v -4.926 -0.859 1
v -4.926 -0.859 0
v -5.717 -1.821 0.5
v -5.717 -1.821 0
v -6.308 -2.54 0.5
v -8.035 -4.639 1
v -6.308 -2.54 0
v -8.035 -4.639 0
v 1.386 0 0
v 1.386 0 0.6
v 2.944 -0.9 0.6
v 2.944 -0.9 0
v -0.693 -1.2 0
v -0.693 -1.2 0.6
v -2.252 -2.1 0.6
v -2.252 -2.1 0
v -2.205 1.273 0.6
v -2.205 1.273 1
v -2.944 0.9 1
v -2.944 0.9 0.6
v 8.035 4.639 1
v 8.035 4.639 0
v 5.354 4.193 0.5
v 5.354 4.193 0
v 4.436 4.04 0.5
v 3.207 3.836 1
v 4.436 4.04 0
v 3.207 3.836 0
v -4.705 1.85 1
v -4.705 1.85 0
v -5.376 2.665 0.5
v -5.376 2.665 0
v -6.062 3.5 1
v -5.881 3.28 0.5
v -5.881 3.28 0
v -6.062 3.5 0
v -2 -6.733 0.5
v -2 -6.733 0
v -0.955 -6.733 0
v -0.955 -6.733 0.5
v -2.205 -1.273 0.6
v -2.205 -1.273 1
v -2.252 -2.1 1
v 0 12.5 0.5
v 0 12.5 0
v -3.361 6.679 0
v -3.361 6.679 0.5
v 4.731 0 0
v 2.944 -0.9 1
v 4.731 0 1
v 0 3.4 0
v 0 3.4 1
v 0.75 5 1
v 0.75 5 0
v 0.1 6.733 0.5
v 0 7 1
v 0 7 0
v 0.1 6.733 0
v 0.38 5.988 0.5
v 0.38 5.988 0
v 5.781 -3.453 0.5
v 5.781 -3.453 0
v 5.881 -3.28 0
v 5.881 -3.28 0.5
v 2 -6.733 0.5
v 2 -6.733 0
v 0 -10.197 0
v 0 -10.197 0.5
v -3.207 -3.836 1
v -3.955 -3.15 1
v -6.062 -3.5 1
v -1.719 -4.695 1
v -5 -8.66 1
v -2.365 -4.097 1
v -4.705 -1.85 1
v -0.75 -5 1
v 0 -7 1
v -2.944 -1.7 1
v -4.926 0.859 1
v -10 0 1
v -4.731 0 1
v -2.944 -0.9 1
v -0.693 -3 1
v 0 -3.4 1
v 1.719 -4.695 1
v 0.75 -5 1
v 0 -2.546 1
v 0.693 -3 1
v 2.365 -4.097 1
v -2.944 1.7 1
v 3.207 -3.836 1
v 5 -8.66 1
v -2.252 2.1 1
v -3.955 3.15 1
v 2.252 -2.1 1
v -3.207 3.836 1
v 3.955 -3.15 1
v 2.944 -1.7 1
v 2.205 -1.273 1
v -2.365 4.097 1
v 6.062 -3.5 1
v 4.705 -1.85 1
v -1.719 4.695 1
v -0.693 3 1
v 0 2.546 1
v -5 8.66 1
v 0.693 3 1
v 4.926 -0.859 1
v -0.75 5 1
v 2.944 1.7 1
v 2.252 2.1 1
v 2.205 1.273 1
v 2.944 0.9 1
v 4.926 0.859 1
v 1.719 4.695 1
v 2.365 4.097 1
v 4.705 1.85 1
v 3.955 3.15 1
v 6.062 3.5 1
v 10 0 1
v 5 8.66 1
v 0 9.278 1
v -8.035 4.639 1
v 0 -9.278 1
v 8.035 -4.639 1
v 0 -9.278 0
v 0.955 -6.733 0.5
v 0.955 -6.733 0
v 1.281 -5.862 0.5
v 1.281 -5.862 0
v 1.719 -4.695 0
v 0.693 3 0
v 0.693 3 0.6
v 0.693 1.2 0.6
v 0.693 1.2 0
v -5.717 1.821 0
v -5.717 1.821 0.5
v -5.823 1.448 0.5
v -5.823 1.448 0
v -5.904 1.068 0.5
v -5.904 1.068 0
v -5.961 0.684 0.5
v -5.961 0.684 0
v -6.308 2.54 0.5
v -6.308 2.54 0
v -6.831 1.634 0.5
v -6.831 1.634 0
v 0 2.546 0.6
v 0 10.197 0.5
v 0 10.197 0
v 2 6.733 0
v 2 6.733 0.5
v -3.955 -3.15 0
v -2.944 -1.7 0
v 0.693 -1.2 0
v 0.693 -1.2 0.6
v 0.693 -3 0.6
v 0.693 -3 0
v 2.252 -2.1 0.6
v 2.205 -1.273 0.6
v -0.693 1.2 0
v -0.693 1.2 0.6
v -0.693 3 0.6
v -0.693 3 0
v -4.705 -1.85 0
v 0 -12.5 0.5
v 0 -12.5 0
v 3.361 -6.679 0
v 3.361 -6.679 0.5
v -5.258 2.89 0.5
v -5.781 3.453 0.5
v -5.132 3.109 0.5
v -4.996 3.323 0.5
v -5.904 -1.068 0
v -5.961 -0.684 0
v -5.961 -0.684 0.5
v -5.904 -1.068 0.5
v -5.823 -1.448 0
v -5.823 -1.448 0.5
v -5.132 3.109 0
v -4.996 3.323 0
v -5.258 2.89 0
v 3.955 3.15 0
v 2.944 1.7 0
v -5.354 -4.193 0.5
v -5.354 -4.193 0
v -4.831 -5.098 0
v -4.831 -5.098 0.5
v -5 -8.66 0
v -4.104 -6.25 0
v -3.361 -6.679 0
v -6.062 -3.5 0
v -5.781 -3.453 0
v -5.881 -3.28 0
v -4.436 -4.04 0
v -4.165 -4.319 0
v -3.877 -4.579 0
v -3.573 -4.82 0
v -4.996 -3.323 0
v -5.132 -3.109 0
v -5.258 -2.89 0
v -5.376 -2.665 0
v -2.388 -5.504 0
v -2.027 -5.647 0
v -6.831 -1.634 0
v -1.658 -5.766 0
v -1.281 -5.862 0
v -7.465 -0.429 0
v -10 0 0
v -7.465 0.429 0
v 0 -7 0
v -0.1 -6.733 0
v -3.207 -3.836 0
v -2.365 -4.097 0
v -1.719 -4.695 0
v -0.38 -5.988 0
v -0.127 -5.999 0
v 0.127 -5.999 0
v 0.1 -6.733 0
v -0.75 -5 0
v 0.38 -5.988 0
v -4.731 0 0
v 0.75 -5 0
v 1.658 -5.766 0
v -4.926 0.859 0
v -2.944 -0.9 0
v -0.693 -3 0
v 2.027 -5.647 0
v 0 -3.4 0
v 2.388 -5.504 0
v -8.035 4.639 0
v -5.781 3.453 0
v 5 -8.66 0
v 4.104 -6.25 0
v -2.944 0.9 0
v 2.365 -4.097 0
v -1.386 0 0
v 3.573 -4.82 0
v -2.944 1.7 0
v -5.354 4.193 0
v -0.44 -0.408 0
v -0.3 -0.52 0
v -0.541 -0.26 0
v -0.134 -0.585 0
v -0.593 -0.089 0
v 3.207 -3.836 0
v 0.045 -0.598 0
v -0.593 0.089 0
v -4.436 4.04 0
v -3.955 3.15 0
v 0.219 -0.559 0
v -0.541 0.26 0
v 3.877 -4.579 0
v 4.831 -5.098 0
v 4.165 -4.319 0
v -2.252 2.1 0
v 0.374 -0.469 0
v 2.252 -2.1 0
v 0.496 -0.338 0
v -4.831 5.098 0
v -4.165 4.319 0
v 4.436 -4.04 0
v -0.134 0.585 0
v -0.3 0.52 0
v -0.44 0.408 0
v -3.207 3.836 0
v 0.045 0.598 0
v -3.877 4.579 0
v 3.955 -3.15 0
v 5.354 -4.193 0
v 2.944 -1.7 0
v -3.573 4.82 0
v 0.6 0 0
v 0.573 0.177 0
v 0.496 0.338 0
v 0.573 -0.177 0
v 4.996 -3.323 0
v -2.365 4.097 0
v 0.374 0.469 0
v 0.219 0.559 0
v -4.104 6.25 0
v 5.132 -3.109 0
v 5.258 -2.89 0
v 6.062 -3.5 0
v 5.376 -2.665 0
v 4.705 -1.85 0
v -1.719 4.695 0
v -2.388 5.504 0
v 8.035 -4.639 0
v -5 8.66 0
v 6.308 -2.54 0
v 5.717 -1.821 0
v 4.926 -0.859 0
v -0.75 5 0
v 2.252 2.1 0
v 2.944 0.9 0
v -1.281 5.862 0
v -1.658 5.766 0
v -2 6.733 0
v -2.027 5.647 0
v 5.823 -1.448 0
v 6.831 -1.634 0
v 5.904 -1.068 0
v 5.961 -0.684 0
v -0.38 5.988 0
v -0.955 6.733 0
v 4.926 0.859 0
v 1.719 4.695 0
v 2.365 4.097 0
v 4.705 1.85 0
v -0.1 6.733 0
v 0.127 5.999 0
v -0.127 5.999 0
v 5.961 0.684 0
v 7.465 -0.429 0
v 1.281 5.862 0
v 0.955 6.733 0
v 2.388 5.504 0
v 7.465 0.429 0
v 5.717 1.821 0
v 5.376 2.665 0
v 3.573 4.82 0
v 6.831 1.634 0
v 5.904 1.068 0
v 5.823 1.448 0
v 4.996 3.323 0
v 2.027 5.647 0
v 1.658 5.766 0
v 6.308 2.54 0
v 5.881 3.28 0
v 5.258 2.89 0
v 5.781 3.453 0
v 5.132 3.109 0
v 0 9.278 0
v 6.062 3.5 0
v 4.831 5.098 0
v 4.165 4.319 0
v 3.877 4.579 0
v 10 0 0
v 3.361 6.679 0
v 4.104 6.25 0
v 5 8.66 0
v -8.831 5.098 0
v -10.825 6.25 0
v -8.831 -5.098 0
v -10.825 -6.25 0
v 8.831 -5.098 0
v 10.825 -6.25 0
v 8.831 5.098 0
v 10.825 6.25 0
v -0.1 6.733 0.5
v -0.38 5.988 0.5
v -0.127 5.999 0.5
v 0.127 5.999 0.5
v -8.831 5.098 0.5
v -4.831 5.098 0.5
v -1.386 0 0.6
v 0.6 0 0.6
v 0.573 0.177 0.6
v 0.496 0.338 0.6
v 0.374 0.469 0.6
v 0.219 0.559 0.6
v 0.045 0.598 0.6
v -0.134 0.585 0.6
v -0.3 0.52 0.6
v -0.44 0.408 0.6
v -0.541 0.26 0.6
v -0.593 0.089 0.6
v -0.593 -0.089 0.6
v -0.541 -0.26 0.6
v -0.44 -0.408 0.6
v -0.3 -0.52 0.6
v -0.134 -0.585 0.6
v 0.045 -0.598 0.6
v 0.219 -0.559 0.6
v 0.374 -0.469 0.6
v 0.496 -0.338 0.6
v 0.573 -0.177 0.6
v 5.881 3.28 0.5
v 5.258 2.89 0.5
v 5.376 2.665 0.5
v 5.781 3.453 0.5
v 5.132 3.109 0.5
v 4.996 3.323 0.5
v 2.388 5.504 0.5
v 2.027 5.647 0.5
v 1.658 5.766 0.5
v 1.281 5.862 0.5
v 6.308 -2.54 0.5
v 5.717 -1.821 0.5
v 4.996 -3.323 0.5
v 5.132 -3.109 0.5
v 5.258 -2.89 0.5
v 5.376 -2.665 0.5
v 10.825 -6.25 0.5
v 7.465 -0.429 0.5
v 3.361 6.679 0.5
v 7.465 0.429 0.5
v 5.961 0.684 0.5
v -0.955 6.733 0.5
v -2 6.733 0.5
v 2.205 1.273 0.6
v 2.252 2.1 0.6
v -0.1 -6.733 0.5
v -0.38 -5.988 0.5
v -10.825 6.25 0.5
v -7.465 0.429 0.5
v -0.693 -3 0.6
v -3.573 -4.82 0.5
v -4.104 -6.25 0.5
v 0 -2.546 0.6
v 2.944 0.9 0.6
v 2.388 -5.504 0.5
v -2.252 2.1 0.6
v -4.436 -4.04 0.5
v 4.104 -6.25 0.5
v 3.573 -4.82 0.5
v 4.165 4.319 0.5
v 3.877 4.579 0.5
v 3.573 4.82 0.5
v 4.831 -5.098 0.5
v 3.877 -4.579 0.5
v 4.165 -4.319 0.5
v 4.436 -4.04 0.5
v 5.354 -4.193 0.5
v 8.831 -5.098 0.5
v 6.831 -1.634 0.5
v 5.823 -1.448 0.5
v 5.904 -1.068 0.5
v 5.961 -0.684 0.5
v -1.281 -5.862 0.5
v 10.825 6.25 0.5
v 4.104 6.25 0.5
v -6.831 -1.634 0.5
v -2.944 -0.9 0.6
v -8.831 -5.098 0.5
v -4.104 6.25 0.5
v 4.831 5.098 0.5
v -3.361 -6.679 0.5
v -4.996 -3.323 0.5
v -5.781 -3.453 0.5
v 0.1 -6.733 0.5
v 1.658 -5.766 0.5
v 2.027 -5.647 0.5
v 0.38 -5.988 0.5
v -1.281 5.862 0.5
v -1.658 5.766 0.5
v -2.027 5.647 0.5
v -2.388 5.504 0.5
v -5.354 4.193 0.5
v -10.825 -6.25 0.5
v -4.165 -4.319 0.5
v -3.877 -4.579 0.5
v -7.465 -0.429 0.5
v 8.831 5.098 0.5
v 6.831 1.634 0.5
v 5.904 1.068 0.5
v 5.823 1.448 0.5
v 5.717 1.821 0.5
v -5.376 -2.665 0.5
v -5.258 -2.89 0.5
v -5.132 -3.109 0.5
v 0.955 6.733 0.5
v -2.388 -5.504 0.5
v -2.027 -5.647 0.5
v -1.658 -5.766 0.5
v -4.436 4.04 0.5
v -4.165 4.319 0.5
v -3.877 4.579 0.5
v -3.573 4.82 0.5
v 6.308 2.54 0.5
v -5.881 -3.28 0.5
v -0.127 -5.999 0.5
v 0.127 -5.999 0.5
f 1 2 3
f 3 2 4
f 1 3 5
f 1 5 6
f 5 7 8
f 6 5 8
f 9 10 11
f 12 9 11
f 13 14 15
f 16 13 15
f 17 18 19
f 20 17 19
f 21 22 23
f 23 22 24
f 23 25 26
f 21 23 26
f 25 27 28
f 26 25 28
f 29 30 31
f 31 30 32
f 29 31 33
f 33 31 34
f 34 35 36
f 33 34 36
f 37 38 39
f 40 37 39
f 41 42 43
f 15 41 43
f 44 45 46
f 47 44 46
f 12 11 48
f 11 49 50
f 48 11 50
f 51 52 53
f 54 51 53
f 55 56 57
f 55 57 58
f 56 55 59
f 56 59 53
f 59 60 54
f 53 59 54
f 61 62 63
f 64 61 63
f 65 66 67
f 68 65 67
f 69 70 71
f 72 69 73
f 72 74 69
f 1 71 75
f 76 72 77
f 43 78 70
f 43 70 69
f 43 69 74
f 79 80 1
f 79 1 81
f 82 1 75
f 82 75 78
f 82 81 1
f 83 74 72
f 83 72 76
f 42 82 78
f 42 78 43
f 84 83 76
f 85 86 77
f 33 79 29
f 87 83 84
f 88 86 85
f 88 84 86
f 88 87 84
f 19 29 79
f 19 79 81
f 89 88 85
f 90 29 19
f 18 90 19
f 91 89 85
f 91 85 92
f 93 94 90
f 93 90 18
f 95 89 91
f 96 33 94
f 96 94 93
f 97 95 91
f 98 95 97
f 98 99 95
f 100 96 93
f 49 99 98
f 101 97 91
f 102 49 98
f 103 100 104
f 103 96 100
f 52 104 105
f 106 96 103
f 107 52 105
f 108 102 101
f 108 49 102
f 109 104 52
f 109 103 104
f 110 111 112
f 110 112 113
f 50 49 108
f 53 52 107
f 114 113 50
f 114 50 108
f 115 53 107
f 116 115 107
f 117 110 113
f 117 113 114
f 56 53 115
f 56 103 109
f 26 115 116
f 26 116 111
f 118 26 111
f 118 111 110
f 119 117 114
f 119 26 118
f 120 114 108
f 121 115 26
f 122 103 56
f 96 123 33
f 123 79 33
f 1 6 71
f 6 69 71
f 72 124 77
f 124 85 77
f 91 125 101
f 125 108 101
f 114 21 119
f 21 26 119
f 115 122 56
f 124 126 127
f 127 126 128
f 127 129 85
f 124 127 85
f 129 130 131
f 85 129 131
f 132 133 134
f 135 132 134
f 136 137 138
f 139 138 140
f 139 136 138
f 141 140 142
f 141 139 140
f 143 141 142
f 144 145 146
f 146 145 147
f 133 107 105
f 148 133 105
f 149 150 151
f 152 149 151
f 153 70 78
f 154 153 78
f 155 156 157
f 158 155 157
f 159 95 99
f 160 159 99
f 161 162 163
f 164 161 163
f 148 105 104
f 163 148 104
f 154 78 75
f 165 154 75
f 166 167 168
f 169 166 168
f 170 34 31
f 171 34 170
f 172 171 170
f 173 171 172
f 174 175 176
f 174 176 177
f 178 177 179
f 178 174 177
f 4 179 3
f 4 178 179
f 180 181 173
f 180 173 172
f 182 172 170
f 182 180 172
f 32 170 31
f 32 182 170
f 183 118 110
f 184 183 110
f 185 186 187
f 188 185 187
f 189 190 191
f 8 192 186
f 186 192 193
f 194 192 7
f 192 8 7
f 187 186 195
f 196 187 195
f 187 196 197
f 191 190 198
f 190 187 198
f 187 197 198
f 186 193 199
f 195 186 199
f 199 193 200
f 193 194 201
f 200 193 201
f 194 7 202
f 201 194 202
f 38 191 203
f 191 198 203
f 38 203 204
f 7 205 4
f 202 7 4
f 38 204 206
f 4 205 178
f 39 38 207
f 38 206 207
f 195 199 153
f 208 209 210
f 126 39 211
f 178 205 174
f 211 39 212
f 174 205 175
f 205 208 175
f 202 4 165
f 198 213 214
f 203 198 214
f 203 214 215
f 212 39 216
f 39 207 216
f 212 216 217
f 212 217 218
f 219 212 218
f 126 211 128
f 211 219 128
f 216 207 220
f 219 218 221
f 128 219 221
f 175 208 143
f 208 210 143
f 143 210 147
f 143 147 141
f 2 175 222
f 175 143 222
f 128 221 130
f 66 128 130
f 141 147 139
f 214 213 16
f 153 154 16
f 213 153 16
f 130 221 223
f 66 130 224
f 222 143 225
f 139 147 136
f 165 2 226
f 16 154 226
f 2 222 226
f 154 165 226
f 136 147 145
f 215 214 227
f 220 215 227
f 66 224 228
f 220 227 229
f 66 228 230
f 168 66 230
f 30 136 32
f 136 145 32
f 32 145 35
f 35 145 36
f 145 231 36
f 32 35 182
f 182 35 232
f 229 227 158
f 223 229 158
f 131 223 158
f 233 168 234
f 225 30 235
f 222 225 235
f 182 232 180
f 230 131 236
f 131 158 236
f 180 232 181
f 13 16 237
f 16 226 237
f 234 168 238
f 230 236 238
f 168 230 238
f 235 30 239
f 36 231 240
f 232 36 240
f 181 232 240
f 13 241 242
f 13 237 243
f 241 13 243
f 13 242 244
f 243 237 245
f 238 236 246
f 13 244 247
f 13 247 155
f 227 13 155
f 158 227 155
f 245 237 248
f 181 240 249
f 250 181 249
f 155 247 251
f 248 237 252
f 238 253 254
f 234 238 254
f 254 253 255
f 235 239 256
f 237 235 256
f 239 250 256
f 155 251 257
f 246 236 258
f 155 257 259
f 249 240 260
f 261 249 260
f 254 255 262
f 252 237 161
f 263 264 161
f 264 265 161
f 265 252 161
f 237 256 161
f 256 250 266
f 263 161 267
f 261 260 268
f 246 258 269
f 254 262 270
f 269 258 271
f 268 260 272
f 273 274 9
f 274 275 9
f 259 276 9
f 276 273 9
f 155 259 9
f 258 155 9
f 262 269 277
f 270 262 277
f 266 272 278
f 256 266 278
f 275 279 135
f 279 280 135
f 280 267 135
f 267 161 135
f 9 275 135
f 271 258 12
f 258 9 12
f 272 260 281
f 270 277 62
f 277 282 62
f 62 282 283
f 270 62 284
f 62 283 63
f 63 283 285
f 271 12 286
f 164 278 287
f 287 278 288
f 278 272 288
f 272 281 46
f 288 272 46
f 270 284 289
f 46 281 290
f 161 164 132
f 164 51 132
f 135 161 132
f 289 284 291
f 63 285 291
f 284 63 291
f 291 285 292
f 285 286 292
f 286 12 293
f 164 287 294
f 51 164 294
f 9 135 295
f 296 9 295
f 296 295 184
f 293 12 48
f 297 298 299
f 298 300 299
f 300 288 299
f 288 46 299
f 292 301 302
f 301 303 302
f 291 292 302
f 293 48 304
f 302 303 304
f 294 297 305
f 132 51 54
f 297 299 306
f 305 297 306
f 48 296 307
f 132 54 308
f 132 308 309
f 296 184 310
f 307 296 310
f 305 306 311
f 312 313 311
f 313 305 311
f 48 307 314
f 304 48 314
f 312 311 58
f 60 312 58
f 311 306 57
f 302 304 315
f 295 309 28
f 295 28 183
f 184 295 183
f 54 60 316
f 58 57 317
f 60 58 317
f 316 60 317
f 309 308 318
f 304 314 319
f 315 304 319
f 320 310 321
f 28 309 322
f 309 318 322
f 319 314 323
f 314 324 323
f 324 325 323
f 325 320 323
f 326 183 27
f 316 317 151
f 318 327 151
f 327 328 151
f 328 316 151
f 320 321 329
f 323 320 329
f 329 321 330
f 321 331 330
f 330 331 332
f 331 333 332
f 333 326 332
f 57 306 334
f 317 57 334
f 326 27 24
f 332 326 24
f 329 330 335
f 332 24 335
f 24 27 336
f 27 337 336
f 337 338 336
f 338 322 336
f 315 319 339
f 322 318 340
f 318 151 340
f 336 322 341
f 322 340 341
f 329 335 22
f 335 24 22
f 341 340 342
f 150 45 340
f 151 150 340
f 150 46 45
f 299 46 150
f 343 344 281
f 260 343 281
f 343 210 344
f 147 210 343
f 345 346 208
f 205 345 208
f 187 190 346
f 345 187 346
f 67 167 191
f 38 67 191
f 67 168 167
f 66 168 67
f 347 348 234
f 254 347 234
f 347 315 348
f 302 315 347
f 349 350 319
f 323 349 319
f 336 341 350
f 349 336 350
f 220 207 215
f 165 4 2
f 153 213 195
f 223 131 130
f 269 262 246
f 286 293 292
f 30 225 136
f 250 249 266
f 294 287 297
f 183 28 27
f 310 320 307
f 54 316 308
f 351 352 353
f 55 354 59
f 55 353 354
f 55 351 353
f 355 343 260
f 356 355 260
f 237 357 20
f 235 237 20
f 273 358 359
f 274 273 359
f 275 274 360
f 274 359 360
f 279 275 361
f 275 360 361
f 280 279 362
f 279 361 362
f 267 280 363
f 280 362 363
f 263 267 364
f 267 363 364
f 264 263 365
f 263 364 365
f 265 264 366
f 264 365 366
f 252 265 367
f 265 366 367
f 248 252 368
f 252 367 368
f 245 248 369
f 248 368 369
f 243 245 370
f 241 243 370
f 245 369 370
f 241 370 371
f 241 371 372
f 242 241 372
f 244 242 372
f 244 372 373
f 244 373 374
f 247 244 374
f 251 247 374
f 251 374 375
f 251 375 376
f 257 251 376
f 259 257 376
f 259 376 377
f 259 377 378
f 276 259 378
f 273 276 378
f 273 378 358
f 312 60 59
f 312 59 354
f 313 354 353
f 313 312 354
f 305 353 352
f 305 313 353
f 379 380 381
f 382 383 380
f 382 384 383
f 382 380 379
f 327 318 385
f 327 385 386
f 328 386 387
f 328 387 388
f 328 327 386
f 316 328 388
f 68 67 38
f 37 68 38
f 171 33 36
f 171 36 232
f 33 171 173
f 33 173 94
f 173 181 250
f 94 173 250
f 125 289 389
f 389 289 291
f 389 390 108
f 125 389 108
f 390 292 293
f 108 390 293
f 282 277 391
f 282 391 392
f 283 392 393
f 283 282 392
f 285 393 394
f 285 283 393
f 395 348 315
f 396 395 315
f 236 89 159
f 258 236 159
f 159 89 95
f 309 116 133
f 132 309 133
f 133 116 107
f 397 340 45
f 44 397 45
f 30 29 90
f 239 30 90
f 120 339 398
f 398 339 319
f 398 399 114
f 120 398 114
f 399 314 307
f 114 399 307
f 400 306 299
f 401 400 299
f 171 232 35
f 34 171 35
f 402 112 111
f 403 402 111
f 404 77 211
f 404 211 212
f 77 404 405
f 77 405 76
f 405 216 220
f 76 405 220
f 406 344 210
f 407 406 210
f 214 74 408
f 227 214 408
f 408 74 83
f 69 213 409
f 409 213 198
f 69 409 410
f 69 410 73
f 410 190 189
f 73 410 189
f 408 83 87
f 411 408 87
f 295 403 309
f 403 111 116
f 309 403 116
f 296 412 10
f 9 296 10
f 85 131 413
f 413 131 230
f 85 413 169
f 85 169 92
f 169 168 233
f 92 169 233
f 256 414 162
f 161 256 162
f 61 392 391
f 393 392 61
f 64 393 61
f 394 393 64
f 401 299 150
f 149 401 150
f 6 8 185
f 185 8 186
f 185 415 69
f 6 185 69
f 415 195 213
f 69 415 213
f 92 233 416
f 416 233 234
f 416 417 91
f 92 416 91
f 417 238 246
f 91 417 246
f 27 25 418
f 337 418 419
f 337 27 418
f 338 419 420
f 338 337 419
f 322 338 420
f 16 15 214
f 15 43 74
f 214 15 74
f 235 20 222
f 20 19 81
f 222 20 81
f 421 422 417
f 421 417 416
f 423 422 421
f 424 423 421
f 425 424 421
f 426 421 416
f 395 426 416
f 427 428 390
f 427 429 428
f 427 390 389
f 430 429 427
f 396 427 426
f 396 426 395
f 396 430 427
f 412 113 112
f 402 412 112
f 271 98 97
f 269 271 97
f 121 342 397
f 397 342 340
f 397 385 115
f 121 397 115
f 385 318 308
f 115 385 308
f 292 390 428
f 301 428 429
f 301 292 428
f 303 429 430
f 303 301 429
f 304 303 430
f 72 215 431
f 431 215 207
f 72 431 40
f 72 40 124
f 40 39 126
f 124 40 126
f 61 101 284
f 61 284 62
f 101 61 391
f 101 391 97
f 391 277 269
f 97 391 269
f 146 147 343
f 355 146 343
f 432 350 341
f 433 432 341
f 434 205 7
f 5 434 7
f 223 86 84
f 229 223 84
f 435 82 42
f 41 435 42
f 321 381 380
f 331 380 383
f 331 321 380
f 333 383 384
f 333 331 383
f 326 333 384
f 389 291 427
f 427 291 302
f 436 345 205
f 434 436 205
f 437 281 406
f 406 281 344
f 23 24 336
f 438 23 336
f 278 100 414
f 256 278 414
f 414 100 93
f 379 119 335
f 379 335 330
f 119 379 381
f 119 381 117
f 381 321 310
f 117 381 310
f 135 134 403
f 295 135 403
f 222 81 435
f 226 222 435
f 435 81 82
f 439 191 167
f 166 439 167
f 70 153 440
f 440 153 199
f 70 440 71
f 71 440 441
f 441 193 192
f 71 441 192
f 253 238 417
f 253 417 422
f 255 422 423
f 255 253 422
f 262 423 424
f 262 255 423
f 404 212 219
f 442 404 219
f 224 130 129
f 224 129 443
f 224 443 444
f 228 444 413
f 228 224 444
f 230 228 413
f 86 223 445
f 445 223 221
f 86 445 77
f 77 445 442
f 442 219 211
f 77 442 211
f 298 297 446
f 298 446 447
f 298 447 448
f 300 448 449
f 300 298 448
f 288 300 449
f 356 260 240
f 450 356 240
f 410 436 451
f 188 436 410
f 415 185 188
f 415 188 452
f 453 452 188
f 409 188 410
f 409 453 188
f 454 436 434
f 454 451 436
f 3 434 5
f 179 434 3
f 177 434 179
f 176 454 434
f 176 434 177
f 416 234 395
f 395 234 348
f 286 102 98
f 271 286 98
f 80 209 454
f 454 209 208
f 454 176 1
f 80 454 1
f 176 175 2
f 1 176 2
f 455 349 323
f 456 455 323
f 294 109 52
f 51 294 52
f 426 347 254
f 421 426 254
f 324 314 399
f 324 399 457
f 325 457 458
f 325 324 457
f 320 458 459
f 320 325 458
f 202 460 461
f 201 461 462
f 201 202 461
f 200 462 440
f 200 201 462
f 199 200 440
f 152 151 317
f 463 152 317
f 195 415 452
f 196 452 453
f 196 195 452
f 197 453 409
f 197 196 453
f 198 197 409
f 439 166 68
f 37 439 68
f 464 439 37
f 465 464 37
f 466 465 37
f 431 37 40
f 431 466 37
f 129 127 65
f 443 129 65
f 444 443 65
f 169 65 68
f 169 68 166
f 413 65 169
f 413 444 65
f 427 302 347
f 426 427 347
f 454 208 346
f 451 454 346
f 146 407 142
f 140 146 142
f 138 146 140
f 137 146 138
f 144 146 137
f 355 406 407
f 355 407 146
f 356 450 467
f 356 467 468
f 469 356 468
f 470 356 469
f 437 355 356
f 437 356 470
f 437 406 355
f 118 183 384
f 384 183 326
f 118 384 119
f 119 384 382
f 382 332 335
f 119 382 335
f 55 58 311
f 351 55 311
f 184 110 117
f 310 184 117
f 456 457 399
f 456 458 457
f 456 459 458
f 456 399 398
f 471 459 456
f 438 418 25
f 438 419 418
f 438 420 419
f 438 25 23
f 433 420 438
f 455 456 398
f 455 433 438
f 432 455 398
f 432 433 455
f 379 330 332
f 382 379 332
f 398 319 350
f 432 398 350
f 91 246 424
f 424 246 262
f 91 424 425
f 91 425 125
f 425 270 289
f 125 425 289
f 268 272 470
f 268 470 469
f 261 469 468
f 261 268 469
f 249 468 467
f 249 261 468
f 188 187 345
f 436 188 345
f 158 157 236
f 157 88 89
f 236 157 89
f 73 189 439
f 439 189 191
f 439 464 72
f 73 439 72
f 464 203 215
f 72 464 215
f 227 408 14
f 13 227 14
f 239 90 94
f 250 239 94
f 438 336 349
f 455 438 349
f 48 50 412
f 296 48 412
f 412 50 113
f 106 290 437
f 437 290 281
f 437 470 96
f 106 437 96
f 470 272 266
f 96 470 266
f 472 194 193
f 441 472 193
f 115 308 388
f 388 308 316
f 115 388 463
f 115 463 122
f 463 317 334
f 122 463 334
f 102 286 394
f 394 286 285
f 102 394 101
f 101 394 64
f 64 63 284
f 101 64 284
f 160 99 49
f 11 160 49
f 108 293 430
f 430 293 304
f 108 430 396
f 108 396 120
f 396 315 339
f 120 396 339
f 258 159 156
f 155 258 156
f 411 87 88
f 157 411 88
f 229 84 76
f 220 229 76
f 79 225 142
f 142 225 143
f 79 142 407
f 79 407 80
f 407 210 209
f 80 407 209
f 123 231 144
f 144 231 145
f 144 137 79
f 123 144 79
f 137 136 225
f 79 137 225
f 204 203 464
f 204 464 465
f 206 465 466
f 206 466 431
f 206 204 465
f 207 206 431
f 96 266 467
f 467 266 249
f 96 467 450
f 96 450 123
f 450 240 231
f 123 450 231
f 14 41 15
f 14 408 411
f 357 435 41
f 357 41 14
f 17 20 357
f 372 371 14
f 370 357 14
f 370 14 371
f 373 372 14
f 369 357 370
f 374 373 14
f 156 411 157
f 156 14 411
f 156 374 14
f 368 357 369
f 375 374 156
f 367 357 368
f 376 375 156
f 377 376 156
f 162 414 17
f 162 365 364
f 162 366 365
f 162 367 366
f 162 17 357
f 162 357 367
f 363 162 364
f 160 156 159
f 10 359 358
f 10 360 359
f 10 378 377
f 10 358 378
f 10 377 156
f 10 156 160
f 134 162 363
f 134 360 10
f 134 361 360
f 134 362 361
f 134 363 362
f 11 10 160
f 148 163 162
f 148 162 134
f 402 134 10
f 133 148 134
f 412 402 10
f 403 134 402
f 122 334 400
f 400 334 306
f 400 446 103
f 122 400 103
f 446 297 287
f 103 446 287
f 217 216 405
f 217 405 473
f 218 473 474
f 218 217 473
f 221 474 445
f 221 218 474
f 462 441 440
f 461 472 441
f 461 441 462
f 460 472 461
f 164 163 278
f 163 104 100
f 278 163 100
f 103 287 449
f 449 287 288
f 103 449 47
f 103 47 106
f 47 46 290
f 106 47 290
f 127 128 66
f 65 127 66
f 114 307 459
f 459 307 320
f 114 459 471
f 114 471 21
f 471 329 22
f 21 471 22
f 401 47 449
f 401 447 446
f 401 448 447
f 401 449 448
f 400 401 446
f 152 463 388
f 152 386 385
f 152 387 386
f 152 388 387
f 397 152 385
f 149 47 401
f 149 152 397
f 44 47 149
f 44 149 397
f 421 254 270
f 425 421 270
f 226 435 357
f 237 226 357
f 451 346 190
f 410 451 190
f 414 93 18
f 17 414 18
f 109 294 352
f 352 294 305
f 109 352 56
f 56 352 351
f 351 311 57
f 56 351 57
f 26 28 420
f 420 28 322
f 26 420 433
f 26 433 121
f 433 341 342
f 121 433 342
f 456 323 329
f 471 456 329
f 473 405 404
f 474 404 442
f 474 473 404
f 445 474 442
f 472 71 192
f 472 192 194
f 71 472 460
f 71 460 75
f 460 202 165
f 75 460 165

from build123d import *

# Parameters (mm, degrees)
F0_R     = 6
F1_DEPTH = 0.5
F3_DEPTH = 1
F4_R     = 0.6
F5_DEPTH = 25
F7_DEPTH = 0.4


with BuildPart() as f1:
    # F0 (on Top) → F1 (new body)
    with BuildSketch(Plane.XY):
        Polygon((3.6084391824, 6.25), (0, 12.5), (-3.6084391824, 6.25), align=None)
        Polygon((2, 6.7328579847), (-2, 6.7328579847), (0, 10.1969595999), align=None, mode=Mode.SUBTRACT)
        Polygon((3.6084391824, 6.25), (-3.6084391824, 6.25), (-7.2168783649, 0), (-3.6084391824, -6.25), (3.6084391824, -6.25), (7.2168783649, 0), align=None)
        Circle(F0_R, mode=Mode.SUBTRACT)
        Polygon((-7.2168783649, 0), (-3.6084391824, 6.25), (-10.8253175473, 6.25), align=None)
        Polygon((-8.8308260548, 5.0984797999), (-4.8308260548, 5.0984797999), (-6.8308260548, 1.6343781848), align=None, mode=Mode.SUBTRACT)
        Polygon((10.8253175473, 6.25), (3.6084391824, 6.25), (7.2168783649, 0), align=None)
        Polygon((8.8308260548, 5.0984797999), (6.8308260548, 1.6343781848), (4.8308260548, 5.0984797999), align=None, mode=Mode.SUBTRACT)
        Polygon((-3.6084391824, -6.25), (-7.2168783649, 0), (-10.8253175473, -6.25), align=None)
        Polygon((-8.8308260548, -5.0984797999), (-6.8308260548, -1.6343781848), (-4.8308260548, -5.0984797999), align=None, mode=Mode.SUBTRACT)
        Polygon((10.8253175473, -6.25), (7.2168783649, 0), (3.6084391824, -6.25), align=None)
        Polygon((8.8308260548, -5.0984797999), (4.8308260548, -5.0984797999), (6.8308260548, -1.6343781848), align=None, mode=Mode.SUBTRACT)
        Polygon((3.6084391824, -6.25), (-3.6084391824, -6.25), (0, -12.5), align=None)
        Polygon((0, -10.1969595999), (-2, -6.7328579847), (2, -6.7328579847), align=None, mode=Mode.SUBTRACT)
    extrude(amount=F1_DEPTH)

    # F2 (on Top) → F3 (join)
    with BuildSketch(Plane.XY):
        with BuildLine():
            Line((0, 9.2784009988), (-1.7186464041, 4.6953439211))
            ThreePointArc((-1.7186464041, 4.6953439211), (-2.5, 4.3301270189), (-3.2069639131, 3.8360634066))
            Line((-3.2069639131, 3.8360634066), (-8.0353309714, 4.6392004994))
            Line((-8.0353309714, 4.6392004994), (-4.9256103173, 0.8592805145))
            ThreePointArc((-4.9256103173, 0.8592805145), (-5, 0), (-4.9256103173, -0.8592805145))
            Line((-4.9256103173, -0.8592805145), (-8.0353309714, -4.6392004994))
            Line((-8.0353309714, -4.6392004994), (-3.2069639131, -3.8360634066))
            ThreePointArc((-3.2069639131, -3.8360634066), (-2.5, -4.3301270189), (-1.7186464041, -4.6953439211))
            Line((-1.7186464041, -4.6953439211), (0, -9.2784009988))
            Line((0, -9.2784009988), (1.7186464041, -4.6953439211))
            ThreePointArc((1.7186464041, -4.6953439211), (2.5, -4.3301270189), (3.2069639131, -3.8360634066))
            Line((3.2069639131, -3.8360634066), (8.0353309714, -4.6392004994))
            Line((8.0353309714, -4.6392004994), (4.9256103173, -0.8592805145))
            ThreePointArc((4.9256103173, -0.8592805145), (5, 0), (4.9256103173, 0.8592805145))
            Line((4.9256103173, 0.8592805145), (8.0353309714, 4.6392004994))
            Line((8.0353309714, 4.6392004994), (3.2069639131, 3.8360634066))
            ThreePointArc((3.2069639131, 3.8360634066), (2.5, 4.3301270189), (1.7186464041, 4.6953439211))
            Line((1.7186464041, 4.6953439211), (0, 9.2784009988))
        make_face()
        Polygon((-4.7051270189, -1.8504809472), (-3.9551270189, -3.1495190528), (-6.0621778265, -3.5), align=None, mode=Mode.SUBTRACT)
        Polygon((-0.75, -5), (0.75, -5), (0, -7), align=None, mode=Mode.SUBTRACT)
        Polygon((3.9551270189, -3.1495190528), (4.7051270189, -1.8504809472), (6.0621778265, -3.5), align=None, mode=Mode.SUBTRACT)
        Polygon((-3.9551270189, 3.1495190528), (-4.7051270189, 1.8504809472), (-6.0621778265, 3.5), align=None, mode=Mode.SUBTRACT)
        Polygon((4.7051270189, 1.8504809472), (3.9551270189, 3.1495190528), (6.0621778265, 3.5), align=None, mode=Mode.SUBTRACT)
        Polygon((-0.75, 5), (0, 7), (0.75, 5), align=None, mode=Mode.SUBTRACT)
        with BuildLine():
            ThreePointArc((-3.2069639131, 3.8360634066), (-2.5, 4.3301270189), (-1.7186464041, 4.6953439211))
            Line((-1.7186464041, 4.6953439211), (-5, 8.6602540378))
            Line((-5, 8.6602540378), (-3.2069639131, 3.8360634066))
        make_face()
        with BuildLine():
            Line((5, 8.6602540378), (1.7186464041, 4.6953439211))
            ThreePointArc((1.7186464041, 4.6953439211), (2.5, 4.3301270189), (3.2069639131, 3.8360634066))
            Line((3.2069639131, 3.8360634066), (5, 8.6602540378))
        make_face()
        with BuildLine():
            ThreePointArc((-4.9256103173, -0.8592805145), (-5, 0), (-4.9256103173, 0.8592805145))
            Line((-4.9256103173, 0.8592805145), (-10, 0))
            Line((-10, 0), (-4.9256103173, -0.8592805145))
        make_face()
        with BuildLine():
            Line((10, 0), (4.9256103173, 0.8592805145))
            ThreePointArc((4.9256103173, 0.8592805145), (5, 0), (4.9256103173, -0.8592805145))
            Line((4.9256103173, -0.8592805145), (10, 0))
        make_face()
        with BuildLine():
            ThreePointArc((-1.7186464041, -4.6953439211), (-2.5, -4.3301270189), (-3.2069639131, -3.8360634066))
            Line((-3.2069639131, -3.8360634066), (-5, -8.6602540378))
            Line((-5, -8.6602540378), (-1.7186464041, -4.6953439211))
        make_face()
        with BuildLine():
            Line((5, -8.6602540378), (3.2069639131, -3.8360634066))
            ThreePointArc((3.2069639131, -3.8360634066), (2.5, -4.3301270189), (1.7186464041, -4.6953439211))
            Line((1.7186464041, -4.6953439211), (5, -8.6602540378))
        make_face()
    extrude(amount=F3_DEPTH)

    # F4 (on face) → F5 (cut)
    with BuildSketch(Plane.XY.offset(1)):
        Polygon((0.75, 5), (-0.75, 5), (0, 3.4), align=None)
        Polygon((2.3652717414, 4.0967708298), (0.692820323, 3), (0.692820323, 1.2), (2.2516660498, 2.1), align=None)
        Polygon((-2.9444863729, 1.7), (-3.9551270189, 3.1495190528), (-4.7051270189, 1.8504809472), align=None)
        Polygon((-0.692820323, 3), (-2.3652717414, 4.0967708298), (-2.2516660498, 2.1), (-0.692820323, 1.2), align=None)
        Polygon((-2.9444863729, -1.7), (-4.7051270189, -1.8504809472), (-3.9551270189, -3.1495190528), align=None)
        Polygon((-2.9444863729, 0.9), (-4.7305434828, 0), (-2.9444863729, -0.9), (-1.3856406461, 0), align=None)
        Polygon((0, -3.4), (-0.75, -5), (0.75, -5), align=None)
        Polygon((-2.2516660498, -2.1), (-2.3652717414, -4.0967708298), (-0.692820323, -3), (-0.692820323, -1.2), align=None)
        Polygon((2.9444863729, -1.7), (3.9551270189, -3.1495190528), (4.7051270189, -1.8504809472), align=None)
        Polygon((0.692820323, -3), (2.3652717414, -4.0967708298), (2.2516660498, -2.1), (0.692820323, -1.2), align=None)
        Polygon((2.9444863729, 1.7), (4.7051270189, 1.8504809472), (3.9551270189, 3.1495190528), align=None)
        Polygon((2.9444863729, -0.9), (4.7305434828, 0), (2.9444863729, 0.9), (1.3856406461, 0), align=None)
        Circle(F4_R)
    extrude(amount=-F5_DEPTH, mode=Mode.SUBTRACT)

    # F6 (on face) → F7 (cut)
    with BuildSketch(Plane.XY.offset(1)):
        Polygon((0, 2.5456578814), (-0.692820323, 3), (-0.692820323, 1.2), (-2.2516660498, 2.1), (-2.2046043947, 1.2728289407), (-2.9444863729, 0.9), (-1.3856406461, 0), (-2.9444863729, -0.9), (-2.2046043947, -1.2728289407), (-2.2516660498, -2.1), (-0.692820323, -1.2), (-0.692820323, -3), (0, -2.5456578814), (0.692820323, -3), (0.692820323, -1.2), (2.2516660498, -2.1), (2.2046043947, -1.2728289407), (2.9444863729, -0.9), (1.3856406461, 0), (2.9444863729, 0.9), (2.2046043947, 1.2728289407), (2.2516660498, 2.1), (0.692820323, 1.2), (0.692820323, 3), align=None)
    extrude(amount=-F7_DEPTH, mode=Mode.SUBTRACT)


solid = f1.part
